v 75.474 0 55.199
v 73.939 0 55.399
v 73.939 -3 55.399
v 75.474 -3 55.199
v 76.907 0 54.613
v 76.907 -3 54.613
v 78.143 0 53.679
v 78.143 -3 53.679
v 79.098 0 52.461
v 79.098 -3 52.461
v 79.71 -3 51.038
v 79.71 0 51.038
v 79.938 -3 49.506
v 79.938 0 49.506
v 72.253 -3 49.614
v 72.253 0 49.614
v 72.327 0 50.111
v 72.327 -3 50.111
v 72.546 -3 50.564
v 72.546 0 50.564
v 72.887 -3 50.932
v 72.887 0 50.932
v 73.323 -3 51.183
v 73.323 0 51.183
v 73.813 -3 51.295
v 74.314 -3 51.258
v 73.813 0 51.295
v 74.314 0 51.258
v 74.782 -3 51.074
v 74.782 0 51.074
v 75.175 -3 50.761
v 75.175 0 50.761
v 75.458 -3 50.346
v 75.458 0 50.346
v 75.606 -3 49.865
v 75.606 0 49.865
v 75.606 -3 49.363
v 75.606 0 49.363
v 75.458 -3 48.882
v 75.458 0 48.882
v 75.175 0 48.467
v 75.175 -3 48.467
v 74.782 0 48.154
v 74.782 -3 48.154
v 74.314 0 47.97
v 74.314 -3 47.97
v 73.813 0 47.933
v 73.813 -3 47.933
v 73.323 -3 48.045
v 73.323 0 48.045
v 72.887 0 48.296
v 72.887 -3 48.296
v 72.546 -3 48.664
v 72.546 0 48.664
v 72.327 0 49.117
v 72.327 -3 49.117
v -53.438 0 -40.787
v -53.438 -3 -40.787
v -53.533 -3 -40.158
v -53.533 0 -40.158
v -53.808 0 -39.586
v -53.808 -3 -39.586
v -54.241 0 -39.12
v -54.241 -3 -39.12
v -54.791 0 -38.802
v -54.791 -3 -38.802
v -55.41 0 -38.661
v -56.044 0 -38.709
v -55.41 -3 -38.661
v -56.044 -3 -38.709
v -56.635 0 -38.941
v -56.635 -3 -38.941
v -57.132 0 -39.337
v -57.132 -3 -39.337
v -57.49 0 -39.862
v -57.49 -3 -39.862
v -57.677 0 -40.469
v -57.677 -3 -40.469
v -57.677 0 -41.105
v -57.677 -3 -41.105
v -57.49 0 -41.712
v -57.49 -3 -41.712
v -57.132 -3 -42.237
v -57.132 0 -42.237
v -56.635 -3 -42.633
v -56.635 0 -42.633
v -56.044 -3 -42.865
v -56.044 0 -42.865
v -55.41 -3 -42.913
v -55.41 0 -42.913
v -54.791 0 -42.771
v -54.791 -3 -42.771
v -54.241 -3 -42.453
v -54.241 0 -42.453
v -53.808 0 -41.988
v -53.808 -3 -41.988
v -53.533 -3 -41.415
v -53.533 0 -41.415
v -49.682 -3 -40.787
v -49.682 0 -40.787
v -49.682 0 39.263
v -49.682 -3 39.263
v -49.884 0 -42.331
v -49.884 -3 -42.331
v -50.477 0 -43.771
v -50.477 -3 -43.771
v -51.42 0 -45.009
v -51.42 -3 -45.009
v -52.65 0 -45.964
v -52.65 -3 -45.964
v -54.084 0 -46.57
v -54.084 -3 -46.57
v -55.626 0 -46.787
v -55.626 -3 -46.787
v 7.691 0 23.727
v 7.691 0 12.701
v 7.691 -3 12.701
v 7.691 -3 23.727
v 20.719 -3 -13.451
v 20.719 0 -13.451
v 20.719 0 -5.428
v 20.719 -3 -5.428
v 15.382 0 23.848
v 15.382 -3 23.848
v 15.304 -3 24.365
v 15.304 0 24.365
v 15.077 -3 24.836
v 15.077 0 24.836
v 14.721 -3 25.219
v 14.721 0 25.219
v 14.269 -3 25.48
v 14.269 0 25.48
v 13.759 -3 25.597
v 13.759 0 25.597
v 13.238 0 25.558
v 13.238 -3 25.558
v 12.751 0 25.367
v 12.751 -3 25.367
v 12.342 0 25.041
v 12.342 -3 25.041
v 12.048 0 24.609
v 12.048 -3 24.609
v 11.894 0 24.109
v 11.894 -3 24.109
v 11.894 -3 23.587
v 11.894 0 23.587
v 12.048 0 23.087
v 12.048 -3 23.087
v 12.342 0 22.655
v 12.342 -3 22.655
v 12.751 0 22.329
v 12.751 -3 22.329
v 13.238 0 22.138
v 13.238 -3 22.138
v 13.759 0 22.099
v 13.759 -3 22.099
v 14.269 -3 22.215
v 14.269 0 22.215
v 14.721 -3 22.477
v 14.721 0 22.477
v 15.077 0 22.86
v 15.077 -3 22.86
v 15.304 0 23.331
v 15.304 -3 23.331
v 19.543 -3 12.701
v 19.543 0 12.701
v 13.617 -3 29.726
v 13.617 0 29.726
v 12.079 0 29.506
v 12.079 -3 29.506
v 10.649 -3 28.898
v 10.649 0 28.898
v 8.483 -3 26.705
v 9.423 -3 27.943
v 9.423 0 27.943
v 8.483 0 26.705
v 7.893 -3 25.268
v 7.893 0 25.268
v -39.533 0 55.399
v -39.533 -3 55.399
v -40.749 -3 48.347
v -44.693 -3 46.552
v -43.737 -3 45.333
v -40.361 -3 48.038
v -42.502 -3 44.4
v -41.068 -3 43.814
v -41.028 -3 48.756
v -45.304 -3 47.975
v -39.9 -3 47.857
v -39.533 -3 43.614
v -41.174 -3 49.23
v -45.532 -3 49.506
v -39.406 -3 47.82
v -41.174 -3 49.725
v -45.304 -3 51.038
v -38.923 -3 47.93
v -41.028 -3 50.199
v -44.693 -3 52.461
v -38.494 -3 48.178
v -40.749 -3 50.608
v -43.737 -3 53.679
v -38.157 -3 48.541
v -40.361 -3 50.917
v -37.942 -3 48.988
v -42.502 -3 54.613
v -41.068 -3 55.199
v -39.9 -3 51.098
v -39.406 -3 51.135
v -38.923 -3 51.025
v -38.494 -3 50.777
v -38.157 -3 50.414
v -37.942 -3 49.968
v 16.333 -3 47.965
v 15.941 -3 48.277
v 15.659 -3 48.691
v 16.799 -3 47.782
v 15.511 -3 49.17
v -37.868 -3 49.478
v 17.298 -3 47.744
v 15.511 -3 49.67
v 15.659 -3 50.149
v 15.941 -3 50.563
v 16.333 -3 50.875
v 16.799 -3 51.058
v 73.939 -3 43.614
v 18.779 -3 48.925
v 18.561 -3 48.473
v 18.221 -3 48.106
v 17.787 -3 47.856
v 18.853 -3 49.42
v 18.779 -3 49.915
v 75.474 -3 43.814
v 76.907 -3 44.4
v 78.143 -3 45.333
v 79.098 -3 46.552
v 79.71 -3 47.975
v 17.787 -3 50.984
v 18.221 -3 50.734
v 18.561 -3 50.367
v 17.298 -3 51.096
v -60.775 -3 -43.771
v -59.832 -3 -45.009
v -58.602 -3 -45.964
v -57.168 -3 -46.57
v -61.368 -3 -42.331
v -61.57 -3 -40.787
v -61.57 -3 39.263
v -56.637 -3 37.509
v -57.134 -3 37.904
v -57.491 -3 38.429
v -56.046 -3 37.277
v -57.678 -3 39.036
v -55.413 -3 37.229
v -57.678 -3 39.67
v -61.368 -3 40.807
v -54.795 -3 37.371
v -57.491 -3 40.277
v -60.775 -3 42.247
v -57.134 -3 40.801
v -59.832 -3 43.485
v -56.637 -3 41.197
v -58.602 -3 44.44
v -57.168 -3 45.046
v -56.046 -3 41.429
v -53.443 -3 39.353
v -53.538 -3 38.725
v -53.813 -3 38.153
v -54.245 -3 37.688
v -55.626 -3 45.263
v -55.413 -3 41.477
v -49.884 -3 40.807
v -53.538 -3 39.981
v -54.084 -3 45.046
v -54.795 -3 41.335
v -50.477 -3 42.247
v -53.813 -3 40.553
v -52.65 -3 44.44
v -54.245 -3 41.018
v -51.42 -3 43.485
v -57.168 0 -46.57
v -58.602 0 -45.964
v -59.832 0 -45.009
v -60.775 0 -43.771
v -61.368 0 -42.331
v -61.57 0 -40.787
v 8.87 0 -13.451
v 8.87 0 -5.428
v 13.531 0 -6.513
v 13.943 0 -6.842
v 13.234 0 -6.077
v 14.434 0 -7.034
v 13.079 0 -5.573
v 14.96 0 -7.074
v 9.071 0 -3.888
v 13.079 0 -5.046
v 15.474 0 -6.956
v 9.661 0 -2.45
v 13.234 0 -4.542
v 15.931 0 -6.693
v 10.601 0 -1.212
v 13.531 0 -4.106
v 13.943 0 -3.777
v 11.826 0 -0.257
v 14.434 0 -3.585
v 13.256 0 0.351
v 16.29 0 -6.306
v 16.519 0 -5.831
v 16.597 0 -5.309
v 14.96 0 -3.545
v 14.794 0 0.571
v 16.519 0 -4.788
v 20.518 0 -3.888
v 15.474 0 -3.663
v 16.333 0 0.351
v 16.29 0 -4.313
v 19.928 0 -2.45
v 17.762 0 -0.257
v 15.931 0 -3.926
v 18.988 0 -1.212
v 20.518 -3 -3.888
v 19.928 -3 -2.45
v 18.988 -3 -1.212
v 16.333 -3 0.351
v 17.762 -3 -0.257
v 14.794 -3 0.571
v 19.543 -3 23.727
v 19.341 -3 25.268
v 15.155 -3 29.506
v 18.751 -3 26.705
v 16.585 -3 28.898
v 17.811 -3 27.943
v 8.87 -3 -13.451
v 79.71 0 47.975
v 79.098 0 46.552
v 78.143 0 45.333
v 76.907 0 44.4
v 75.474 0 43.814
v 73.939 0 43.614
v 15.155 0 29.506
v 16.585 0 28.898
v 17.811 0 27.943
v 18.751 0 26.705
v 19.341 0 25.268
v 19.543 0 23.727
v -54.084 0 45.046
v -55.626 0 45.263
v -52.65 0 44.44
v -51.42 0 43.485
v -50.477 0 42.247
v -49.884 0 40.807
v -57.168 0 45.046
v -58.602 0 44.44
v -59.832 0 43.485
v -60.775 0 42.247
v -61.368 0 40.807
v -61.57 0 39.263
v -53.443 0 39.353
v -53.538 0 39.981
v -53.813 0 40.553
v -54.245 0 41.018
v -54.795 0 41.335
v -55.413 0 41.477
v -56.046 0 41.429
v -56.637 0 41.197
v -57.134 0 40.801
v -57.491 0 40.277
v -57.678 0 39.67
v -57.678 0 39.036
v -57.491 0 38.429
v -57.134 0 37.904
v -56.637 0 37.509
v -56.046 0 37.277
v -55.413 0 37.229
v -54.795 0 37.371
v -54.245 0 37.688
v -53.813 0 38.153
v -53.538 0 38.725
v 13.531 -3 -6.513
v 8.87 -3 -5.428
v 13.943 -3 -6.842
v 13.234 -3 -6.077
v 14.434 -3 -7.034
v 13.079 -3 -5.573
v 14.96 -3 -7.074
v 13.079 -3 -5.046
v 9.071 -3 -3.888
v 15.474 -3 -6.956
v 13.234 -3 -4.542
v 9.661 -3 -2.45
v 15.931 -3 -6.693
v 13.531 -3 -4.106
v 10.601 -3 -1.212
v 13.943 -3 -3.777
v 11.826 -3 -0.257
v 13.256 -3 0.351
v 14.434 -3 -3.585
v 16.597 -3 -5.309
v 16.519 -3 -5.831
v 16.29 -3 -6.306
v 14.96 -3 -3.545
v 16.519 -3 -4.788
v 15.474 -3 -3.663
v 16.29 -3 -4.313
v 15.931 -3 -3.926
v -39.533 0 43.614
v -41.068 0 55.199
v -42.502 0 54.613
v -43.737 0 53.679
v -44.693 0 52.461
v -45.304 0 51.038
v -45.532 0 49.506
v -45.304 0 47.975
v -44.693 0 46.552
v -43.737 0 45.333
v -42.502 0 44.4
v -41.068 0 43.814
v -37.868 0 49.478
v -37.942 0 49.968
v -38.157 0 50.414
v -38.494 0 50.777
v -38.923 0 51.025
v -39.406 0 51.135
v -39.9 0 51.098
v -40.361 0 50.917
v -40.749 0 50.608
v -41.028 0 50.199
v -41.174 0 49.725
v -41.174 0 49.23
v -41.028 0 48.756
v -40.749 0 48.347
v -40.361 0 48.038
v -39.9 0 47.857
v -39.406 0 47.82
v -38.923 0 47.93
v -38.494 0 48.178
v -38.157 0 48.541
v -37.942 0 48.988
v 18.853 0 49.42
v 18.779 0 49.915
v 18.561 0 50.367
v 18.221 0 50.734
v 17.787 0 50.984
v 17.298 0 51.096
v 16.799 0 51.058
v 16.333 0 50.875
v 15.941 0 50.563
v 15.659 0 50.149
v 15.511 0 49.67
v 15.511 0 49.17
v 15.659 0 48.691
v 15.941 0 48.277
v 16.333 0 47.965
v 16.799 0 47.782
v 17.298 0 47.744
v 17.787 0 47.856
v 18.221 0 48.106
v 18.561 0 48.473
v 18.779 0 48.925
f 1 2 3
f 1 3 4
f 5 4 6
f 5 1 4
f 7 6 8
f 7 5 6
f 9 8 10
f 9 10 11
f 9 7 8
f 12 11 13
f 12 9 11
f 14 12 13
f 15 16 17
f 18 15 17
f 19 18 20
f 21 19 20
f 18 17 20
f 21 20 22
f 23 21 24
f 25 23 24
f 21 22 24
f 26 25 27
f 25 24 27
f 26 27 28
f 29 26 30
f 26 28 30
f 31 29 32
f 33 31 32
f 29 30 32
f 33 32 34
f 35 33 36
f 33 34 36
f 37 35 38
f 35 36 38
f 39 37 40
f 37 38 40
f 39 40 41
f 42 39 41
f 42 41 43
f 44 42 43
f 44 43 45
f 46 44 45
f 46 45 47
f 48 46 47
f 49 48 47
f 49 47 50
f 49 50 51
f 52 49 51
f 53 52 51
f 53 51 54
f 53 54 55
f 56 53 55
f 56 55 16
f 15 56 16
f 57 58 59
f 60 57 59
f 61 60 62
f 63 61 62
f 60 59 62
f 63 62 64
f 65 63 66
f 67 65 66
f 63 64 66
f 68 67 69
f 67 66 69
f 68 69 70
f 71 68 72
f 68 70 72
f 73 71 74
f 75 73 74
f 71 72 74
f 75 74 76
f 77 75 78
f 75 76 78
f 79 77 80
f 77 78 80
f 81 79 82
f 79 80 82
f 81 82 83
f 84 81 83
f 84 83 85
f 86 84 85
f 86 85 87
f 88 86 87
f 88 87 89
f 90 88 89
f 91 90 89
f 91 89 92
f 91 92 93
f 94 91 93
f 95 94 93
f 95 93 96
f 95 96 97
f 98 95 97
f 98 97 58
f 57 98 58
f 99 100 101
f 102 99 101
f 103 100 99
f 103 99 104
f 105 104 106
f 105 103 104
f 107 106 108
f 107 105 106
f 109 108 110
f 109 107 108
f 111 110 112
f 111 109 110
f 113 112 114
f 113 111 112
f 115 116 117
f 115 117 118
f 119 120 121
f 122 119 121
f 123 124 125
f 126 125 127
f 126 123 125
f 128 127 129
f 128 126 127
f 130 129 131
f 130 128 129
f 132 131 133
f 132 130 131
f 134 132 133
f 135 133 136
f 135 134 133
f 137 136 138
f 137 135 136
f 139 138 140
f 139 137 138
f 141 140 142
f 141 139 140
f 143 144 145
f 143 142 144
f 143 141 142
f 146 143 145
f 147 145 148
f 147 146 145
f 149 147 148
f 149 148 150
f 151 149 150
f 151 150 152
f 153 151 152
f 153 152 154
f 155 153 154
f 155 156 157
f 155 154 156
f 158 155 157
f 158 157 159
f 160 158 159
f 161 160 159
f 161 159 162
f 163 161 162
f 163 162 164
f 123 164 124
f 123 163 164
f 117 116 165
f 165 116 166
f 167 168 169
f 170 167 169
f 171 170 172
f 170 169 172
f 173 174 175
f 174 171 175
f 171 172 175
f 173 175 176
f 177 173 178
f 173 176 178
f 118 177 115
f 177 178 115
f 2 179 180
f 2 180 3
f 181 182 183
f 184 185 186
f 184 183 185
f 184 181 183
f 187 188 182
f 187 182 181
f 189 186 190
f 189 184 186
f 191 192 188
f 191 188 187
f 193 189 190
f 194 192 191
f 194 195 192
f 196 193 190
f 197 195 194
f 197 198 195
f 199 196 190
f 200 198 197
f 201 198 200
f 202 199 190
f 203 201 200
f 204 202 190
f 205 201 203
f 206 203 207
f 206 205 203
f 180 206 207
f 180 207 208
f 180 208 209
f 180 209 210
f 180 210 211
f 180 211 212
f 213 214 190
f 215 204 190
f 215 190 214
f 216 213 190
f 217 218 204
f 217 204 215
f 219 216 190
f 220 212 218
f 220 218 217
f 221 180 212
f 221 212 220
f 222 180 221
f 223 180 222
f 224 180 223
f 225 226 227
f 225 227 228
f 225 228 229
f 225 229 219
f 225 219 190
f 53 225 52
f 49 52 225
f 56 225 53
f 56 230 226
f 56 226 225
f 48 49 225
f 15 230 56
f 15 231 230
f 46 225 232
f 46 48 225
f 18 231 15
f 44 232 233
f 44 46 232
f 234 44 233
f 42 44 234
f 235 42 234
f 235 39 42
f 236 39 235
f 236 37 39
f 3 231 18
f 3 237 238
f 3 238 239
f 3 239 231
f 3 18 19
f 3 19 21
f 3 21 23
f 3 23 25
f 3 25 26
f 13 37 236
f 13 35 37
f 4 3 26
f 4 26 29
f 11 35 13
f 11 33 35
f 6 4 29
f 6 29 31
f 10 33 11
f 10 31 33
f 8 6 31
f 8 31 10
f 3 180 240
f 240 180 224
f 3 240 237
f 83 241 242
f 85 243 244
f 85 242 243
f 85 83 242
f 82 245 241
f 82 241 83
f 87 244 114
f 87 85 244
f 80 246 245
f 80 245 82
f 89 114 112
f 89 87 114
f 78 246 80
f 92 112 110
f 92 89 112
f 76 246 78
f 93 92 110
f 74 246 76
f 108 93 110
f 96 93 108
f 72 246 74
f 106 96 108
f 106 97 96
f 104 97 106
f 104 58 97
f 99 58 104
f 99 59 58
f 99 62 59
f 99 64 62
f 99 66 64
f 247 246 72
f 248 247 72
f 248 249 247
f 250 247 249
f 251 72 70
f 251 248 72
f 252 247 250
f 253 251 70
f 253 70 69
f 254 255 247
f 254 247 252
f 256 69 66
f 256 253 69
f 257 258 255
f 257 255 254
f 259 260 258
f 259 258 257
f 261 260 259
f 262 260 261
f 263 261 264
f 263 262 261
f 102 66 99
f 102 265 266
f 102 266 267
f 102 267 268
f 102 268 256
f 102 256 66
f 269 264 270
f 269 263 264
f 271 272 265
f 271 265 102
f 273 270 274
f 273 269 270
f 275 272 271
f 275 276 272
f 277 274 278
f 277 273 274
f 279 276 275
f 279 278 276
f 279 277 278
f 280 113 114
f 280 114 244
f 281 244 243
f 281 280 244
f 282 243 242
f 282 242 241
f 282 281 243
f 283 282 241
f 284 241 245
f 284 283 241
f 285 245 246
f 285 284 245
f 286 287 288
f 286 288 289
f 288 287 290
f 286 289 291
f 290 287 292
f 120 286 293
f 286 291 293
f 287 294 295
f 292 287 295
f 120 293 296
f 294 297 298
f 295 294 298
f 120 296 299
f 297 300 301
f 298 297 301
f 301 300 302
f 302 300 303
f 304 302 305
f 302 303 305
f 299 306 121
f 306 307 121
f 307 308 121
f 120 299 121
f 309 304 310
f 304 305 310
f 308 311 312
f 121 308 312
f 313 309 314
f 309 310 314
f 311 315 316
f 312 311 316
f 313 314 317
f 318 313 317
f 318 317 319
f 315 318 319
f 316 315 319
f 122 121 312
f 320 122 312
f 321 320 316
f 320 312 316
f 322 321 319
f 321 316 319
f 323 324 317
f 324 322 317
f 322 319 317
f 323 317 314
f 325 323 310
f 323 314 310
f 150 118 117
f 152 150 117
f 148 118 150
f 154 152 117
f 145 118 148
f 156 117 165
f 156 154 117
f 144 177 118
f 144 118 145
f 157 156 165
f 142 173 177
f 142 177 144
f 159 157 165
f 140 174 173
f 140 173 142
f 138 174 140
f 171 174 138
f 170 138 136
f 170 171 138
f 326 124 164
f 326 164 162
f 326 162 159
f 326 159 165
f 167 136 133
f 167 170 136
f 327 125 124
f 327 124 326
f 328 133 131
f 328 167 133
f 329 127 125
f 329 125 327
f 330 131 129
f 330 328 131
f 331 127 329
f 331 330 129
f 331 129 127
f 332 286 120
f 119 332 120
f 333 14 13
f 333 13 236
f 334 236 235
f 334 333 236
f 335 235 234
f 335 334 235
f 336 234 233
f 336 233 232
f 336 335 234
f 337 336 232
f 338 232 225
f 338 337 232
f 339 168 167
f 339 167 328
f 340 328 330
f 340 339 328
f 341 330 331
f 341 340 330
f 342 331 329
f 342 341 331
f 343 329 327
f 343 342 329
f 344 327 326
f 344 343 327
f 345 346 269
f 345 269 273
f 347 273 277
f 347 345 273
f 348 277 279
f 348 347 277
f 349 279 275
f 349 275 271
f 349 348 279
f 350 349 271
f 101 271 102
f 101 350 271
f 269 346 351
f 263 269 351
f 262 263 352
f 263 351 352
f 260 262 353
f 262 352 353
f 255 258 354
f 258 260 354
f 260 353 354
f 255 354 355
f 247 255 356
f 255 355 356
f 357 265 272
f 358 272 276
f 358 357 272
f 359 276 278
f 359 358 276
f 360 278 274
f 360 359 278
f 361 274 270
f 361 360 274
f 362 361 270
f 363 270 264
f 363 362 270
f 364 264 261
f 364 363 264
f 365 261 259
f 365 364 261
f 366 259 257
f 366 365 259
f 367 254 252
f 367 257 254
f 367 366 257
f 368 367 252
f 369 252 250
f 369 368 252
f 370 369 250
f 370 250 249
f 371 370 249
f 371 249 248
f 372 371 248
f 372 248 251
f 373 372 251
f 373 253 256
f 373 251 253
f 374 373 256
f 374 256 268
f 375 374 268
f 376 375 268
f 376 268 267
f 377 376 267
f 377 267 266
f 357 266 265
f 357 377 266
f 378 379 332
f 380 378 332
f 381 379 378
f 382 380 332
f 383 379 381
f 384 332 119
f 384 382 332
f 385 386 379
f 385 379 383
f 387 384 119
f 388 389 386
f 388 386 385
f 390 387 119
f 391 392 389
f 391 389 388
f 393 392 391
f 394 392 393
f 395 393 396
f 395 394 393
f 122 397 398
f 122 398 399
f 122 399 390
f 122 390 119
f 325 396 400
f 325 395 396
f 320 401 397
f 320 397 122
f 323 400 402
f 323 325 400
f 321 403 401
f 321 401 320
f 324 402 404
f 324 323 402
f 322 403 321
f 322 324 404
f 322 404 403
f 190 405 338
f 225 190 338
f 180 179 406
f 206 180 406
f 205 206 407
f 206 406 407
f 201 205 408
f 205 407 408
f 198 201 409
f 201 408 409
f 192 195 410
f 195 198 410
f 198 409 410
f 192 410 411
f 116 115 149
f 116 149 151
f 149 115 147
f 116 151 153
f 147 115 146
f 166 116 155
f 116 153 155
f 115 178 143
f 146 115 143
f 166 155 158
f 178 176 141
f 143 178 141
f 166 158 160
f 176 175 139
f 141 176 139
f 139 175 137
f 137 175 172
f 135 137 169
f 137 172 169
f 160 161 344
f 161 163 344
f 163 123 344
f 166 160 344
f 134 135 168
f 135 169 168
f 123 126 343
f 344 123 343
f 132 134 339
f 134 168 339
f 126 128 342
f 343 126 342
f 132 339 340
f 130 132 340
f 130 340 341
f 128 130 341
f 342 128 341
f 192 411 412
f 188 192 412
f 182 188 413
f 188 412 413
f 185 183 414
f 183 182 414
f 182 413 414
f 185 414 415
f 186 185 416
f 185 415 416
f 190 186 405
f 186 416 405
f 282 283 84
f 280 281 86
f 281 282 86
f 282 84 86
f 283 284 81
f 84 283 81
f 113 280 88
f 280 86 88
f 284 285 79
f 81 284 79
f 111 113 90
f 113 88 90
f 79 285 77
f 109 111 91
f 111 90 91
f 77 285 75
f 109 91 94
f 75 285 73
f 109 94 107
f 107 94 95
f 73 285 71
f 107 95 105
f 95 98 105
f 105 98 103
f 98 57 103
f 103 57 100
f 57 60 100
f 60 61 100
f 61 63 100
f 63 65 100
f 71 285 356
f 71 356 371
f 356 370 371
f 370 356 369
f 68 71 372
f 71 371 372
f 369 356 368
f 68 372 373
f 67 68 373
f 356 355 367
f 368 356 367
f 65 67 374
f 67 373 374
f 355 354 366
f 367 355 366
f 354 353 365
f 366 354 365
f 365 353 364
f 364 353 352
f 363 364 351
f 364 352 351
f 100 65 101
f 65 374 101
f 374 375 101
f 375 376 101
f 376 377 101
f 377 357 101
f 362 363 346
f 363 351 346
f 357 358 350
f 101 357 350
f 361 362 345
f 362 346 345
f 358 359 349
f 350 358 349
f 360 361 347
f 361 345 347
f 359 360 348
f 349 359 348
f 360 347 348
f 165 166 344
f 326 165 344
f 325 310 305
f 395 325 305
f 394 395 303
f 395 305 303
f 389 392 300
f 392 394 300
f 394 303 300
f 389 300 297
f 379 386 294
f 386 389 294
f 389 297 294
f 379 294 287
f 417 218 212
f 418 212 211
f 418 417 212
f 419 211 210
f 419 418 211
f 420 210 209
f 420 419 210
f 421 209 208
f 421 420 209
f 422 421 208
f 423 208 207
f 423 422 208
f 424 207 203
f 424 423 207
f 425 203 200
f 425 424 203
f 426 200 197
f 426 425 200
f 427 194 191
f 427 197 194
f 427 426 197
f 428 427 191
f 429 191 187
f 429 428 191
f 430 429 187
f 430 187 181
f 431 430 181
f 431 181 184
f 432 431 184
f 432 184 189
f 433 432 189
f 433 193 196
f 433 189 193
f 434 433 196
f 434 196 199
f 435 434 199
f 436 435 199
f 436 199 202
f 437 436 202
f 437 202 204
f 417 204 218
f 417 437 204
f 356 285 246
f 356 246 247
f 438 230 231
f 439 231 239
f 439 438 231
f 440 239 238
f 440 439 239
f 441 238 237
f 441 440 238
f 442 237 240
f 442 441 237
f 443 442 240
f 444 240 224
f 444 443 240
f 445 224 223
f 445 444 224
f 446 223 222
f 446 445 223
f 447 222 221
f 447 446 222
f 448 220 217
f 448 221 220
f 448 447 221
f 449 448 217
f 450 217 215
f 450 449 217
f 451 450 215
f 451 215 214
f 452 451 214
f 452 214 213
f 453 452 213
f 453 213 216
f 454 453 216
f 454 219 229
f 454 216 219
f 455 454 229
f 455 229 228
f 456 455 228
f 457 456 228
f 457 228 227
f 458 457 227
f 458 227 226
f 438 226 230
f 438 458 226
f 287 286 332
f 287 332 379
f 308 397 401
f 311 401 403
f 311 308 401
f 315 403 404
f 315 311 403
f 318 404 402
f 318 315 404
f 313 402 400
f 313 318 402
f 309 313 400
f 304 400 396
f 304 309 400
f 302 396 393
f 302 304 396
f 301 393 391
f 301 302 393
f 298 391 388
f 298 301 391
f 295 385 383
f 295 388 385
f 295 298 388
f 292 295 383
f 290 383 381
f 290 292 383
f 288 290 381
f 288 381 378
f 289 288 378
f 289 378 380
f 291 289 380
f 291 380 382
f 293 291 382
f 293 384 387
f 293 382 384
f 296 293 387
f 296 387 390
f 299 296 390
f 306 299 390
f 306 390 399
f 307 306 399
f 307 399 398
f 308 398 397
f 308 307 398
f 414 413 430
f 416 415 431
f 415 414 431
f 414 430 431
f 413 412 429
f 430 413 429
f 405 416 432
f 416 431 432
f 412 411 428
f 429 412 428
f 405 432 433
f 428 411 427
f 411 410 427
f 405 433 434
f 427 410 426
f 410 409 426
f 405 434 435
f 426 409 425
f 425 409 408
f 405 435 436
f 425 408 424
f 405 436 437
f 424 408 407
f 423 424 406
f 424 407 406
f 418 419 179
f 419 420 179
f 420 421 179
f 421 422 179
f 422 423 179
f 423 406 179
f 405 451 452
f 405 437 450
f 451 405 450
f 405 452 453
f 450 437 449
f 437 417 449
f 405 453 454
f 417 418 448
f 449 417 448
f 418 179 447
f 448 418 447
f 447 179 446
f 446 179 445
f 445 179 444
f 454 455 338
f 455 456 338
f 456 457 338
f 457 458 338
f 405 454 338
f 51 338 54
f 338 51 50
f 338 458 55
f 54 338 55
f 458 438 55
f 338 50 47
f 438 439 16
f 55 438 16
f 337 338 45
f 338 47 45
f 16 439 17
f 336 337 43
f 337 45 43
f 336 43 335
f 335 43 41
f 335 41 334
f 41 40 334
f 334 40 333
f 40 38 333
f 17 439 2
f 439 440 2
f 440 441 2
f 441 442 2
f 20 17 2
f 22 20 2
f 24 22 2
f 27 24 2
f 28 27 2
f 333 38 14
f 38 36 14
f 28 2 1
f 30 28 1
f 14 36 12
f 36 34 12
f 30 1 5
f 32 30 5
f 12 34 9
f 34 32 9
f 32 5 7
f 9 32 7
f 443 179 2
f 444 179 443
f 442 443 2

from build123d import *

# Parameters (mm, degrees)
F0_W         = 11.8872001767
F0_H         = 92.0496024191
F1_DEPTH     = 3
F2_T1_DEPTH  = 33
F3_T1_DEPTH  = 33
F4_R         = 2.1296037298
F5_DEPTH     = 25
F6_R         = 2.1316935328
F7_DEPTH     = 11.5
F8_W         = 125.4713088274
F8_H         = 11.7845982313
F9_DEPTH     = 3
F10_T1_DEPTH = 33
F11_T1_DEPTH = 33
F12_R        = 1.6622062421
F13_DEPTH    = 48.8
F14_R        = 1.68602316
F15_DEPTH    = 13.8
F16_R        = 1.68037386
F17_DEPTH    = 14.7
F18_W        = 11.8510928005
F18_H        = 17.0255154371
F19_DEPTH    = 3
F20_T1_DEPTH = 33
F21_R        = 1.75368676
F22_DEPTH    = 6.9
F23_W        = 11.8489861488
F23_H        = 14.0224687639
F24_DEPTH    = 3
F25_T1_DEPTH = 33
F26_R        = 1.7691912445
F27_DEPTH    = 16.9


# Not quite as in the source:
# - a fillet or chamfer that OpenCascade refuses, or shapes differently, is made with other operations: its cross-section is extruded or revolved along the edge and cut away or added


with BuildPart() as f1:
    # F0 (on Front) → F1 (new body)
    with BuildSketch(Plane.XZ):
        with Locations((-55.626001209, -0.7619988173)):
            Rectangle(F0_W, F0_H)
    extrude(amount=F1_DEPTH)

    # F2: fillet of radius 6 on 2 edges, made by hand

    # F2_s2 → F2_t1 (cut)
    with BuildSketch(Plane.XZ.offset(-15)):
        with BuildLine():
            ThreePointArc((-55.5696012974, 45.2628023922), (-59.8122419845, 43.5054430794), (-61.5696012974, 39.2628023922))
            Line((-61.5696012974, 39.2628023922), (-61.5696012974, 45.2628023922))
            Line((-61.5696012974, 45.2628023922), (-55.5696012974, 45.2628023922))
        make_face()
        with BuildLine():
            ThreePointArc((-55.6824011207, 45.2628023922), (-51.4397604335, 43.5054430794), (-49.6824011207, 39.2628023922))
            Line((-49.6824011207, 39.2628023922), (-49.6824011207, 45.2628023922))
            Line((-49.6824011207, 45.2628023922), (-55.6824011207, 45.2628023922))
        make_face()
    extrude(amount=F2_T1_DEPTH, mode=Mode.SUBTRACT)

    # F3: fillet of radius 6 on 2 edges, made by hand

    # F3_s2 → F3_t1 (cut)
    with BuildSketch(Plane.XZ.offset(-15)):
        with BuildLine():
            ThreePointArc((-49.6824011207, -40.7868000269), (-51.4397604335, -45.029440714), (-55.6824011207, -46.7868000269))
            Line((-55.6824011207, -46.7868000269), (-49.6824011207, -46.7868000269))
            Line((-49.6824011207, -46.7868000269), (-49.6824011207, -40.7868000269))
        make_face()
        with BuildLine():
            ThreePointArc((-55.5696012974, -46.7868000269), (-59.8122419845, -45.029440714), (-61.5696012974, -40.7868000269))
            Line((-61.5696012974, -40.7868000269), (-61.5696012974, -46.7868000269))
            Line((-61.5696012974, -46.7868000269), (-55.5696012974, -46.7868000269))
        make_face()
    extrude(amount=F3_T1_DEPTH, mode=Mode.SUBTRACT)

    # F4 (on Front) → F5 (cut)
    with BuildSketch(Plane.XZ):
        with Locations((-55.572591722, 39.3529161811)):
            Circle(F4_R)
    extrude(amount=F5_DEPTH, mode=Mode.SUBTRACT)

    # F6 (on face) → F7 (cut)
    with BuildSketch(Plane.XZ.offset(3)):
        with Locations((-55.5696012974, -40.7868000269)):
            Circle(F6_R)
    extrude(amount=-F7_DEPTH, mode=Mode.SUBTRACT)


with BuildPart() as f9:
    # F8 (on Front) → F9 (new body)
    with BuildSketch(Plane.XZ):
        with Locations((17.2029063106, 49.5063103735)):
            Rectangle(F8_W, F8_H)
    extrude(amount=F9_DEPTH)

    # F10: fillet of radius 6 on 2 edges, made by hand

    # F10_s2 → F10_t1 (cut)
    with BuildSketch(Plane.XZ.offset(-15)):
        with BuildLine():
            ThreePointArc((-39.5327481031, 55.3986094892), (-43.7753887903, 53.6412501763), (-45.5327481031, 49.3986094892))
            Line((-45.5327481031, 49.3986094892), (-45.5327481031, 55.3986094892))
            Line((-45.5327481031, 55.3986094892), (-39.5327481031, 55.3986094892))
        make_face()
        with BuildLine():
            ThreePointArc((-45.5327481031, 49.6140112579), (-43.7753887903, 45.3713705708), (-39.5327481031, 43.6140112579))
            Line((-39.5327481031, 43.6140112579), (-45.5327481031, 43.6140112579))
            Line((-45.5327481031, 43.6140112579), (-45.5327481031, 49.6140112579))
        make_face()
    extrude(amount=F10_T1_DEPTH, mode=Mode.SUBTRACT)

    # F11: fillet of radius 6 on 2 edges, made by hand

    # F11_s2 → F11_t1 (cut)
    with BuildSketch(Plane.XZ.offset(-15)):
        with BuildLine():
            ThreePointArc((73.9385607243, 55.3986094892), (78.1812014114, 53.6412501763), (79.9385607243, 49.3986094892))
            Line((79.9385607243, 49.3986094892), (79.9385607243, 55.3986094892))
            Line((79.9385607243, 55.3986094892), (73.9385607243, 55.3986094892))
        make_face()
        with BuildLine():
            ThreePointArc((79.9385607243, 49.6140112579), (78.1812014114, 45.3713705708), (73.9385607243, 43.6140112579))
            Line((73.9385607243, 43.6140112579), (79.9385607243, 43.6140112579))
            Line((79.9385607243, 43.6140112579), (79.9385607243, 49.6140112579))
        make_face()
    extrude(amount=F11_T1_DEPTH, mode=Mode.SUBTRACT)

    # F12 (on Front) → F13 (cut)
    with BuildSketch(Plane.XZ):
        with Locations((-39.5303107798, 49.4775809348)):
            Circle(F12_R)
    extrude(amount=F13_DEPTH, mode=Mode.SUBTRACT)

    # F14 (on face) → F15 (cut)
    with BuildSketch(Plane(origin=(0, 0, 0), x_dir=(-1, 0, 0), z_dir=(0, 1, 0))):
        with Locations((-73.9385607243, 49.6140112579)):
            Circle(F14_R)
    extrude(amount=-F15_DEPTH, mode=Mode.SUBTRACT)

    # F16 (on Front) → F17 (cut)
    with BuildSketch(Plane.XZ):
        with Locations((17.1728059649, 49.4200251997)):
            Circle(F16_R)
    extrude(amount=F17_DEPTH, mode=Mode.SUBTRACT)


with BuildPart() as f19:
    # F18 (on Front) → F19 (new body)
    with BuildSketch(Plane.XZ):
        with Locations((13.6170322075, 21.2140381336)):
            Rectangle(F18_W, F18_H)
    extrude(amount=F19_DEPTH)

    # F20: fillet of radius 6 on 2 edges, made by hand

    # F20_s2 → F20_t1 (cut)
    with BuildSketch(Plane.XZ.offset(-15)):
        with BuildLine():
            ThreePointArc((13.5425786078, 29.7267958522), (17.7852192949, 27.9694365393), (19.5425786078, 23.7267958522))
            Line((19.5425786078, 23.7267958522), (19.5425786078, 29.7267958522))
            Line((19.5425786078, 29.7267958522), (13.5425786078, 29.7267958522))
        make_face()
        with BuildLine():
            ThreePointArc((13.6914858073, 29.7267958522), (9.4488451202, 27.9694365393), (7.6914858073, 23.7267958522))
            Line((7.6914858073, 23.7267958522), (7.6914858073, 29.7267958522))
            Line((7.6914858073, 29.7267958522), (13.6914858073, 29.7267958522))
        make_face()
    extrude(amount=F20_T1_DEPTH, mode=Mode.SUBTRACT)

    # F21 (on Front) → F22 (cut)
    with BuildSketch(Plane.XZ):
        with Locations((13.627816923, 23.8479375839)):
            Circle(F21_R)
    extrude(amount=F22_DEPTH, mode=Mode.SUBTRACT)


with BuildPart() as f24:
    # F23 (on Front) → F24 (new body)
    with BuildSketch(Plane.XZ):
        with Locations((14.7944297642, -6.4395176305)):
            Rectangle(F23_W, F23_H)
    extrude(amount=F24_DEPTH)

    # F25: fillet of radius 6 on 2 edges, made by hand

    # F25_s2 → F25_t1 (cut)
    with BuildSketch(Plane.XZ.offset(-15)):
        with BuildLine():
            ThreePointArc((14.8699366897, 0.5717167514), (10.6272960026, -1.1856425614), (8.8699366897, -5.4282832486))
            Line((8.8699366897, -5.4282832486), (8.8699366897, 0.5717167514))
            Line((8.8699366897, 0.5717167514), (14.8699366897, 0.5717167514))
        make_face()
        with BuildLine():
            ThreePointArc((20.7189228386, -5.4282832486), (18.9615635257, -1.1856425614), (14.7189228386, 0.5717167514))
            Line((14.7189228386, 0.5717167514), (20.7189228386, 0.5717167514))
            Line((20.7189228386, 0.5717167514), (20.7189228386, -5.4282832486))
        make_face()
    extrude(amount=F25_T1_DEPTH, mode=Mode.SUBTRACT)

    # F26 (on Front) → F27 (cut)
    with BuildSketch(Plane.XZ):
        with Locations((14.828084968, -5.3094546311)):
            Circle(F26_R)
    extrude(amount=F27_DEPTH, mode=Mode.SUBTRACT)


solid = Compound([f1.part, f9.part, f19.part, f24.part])
